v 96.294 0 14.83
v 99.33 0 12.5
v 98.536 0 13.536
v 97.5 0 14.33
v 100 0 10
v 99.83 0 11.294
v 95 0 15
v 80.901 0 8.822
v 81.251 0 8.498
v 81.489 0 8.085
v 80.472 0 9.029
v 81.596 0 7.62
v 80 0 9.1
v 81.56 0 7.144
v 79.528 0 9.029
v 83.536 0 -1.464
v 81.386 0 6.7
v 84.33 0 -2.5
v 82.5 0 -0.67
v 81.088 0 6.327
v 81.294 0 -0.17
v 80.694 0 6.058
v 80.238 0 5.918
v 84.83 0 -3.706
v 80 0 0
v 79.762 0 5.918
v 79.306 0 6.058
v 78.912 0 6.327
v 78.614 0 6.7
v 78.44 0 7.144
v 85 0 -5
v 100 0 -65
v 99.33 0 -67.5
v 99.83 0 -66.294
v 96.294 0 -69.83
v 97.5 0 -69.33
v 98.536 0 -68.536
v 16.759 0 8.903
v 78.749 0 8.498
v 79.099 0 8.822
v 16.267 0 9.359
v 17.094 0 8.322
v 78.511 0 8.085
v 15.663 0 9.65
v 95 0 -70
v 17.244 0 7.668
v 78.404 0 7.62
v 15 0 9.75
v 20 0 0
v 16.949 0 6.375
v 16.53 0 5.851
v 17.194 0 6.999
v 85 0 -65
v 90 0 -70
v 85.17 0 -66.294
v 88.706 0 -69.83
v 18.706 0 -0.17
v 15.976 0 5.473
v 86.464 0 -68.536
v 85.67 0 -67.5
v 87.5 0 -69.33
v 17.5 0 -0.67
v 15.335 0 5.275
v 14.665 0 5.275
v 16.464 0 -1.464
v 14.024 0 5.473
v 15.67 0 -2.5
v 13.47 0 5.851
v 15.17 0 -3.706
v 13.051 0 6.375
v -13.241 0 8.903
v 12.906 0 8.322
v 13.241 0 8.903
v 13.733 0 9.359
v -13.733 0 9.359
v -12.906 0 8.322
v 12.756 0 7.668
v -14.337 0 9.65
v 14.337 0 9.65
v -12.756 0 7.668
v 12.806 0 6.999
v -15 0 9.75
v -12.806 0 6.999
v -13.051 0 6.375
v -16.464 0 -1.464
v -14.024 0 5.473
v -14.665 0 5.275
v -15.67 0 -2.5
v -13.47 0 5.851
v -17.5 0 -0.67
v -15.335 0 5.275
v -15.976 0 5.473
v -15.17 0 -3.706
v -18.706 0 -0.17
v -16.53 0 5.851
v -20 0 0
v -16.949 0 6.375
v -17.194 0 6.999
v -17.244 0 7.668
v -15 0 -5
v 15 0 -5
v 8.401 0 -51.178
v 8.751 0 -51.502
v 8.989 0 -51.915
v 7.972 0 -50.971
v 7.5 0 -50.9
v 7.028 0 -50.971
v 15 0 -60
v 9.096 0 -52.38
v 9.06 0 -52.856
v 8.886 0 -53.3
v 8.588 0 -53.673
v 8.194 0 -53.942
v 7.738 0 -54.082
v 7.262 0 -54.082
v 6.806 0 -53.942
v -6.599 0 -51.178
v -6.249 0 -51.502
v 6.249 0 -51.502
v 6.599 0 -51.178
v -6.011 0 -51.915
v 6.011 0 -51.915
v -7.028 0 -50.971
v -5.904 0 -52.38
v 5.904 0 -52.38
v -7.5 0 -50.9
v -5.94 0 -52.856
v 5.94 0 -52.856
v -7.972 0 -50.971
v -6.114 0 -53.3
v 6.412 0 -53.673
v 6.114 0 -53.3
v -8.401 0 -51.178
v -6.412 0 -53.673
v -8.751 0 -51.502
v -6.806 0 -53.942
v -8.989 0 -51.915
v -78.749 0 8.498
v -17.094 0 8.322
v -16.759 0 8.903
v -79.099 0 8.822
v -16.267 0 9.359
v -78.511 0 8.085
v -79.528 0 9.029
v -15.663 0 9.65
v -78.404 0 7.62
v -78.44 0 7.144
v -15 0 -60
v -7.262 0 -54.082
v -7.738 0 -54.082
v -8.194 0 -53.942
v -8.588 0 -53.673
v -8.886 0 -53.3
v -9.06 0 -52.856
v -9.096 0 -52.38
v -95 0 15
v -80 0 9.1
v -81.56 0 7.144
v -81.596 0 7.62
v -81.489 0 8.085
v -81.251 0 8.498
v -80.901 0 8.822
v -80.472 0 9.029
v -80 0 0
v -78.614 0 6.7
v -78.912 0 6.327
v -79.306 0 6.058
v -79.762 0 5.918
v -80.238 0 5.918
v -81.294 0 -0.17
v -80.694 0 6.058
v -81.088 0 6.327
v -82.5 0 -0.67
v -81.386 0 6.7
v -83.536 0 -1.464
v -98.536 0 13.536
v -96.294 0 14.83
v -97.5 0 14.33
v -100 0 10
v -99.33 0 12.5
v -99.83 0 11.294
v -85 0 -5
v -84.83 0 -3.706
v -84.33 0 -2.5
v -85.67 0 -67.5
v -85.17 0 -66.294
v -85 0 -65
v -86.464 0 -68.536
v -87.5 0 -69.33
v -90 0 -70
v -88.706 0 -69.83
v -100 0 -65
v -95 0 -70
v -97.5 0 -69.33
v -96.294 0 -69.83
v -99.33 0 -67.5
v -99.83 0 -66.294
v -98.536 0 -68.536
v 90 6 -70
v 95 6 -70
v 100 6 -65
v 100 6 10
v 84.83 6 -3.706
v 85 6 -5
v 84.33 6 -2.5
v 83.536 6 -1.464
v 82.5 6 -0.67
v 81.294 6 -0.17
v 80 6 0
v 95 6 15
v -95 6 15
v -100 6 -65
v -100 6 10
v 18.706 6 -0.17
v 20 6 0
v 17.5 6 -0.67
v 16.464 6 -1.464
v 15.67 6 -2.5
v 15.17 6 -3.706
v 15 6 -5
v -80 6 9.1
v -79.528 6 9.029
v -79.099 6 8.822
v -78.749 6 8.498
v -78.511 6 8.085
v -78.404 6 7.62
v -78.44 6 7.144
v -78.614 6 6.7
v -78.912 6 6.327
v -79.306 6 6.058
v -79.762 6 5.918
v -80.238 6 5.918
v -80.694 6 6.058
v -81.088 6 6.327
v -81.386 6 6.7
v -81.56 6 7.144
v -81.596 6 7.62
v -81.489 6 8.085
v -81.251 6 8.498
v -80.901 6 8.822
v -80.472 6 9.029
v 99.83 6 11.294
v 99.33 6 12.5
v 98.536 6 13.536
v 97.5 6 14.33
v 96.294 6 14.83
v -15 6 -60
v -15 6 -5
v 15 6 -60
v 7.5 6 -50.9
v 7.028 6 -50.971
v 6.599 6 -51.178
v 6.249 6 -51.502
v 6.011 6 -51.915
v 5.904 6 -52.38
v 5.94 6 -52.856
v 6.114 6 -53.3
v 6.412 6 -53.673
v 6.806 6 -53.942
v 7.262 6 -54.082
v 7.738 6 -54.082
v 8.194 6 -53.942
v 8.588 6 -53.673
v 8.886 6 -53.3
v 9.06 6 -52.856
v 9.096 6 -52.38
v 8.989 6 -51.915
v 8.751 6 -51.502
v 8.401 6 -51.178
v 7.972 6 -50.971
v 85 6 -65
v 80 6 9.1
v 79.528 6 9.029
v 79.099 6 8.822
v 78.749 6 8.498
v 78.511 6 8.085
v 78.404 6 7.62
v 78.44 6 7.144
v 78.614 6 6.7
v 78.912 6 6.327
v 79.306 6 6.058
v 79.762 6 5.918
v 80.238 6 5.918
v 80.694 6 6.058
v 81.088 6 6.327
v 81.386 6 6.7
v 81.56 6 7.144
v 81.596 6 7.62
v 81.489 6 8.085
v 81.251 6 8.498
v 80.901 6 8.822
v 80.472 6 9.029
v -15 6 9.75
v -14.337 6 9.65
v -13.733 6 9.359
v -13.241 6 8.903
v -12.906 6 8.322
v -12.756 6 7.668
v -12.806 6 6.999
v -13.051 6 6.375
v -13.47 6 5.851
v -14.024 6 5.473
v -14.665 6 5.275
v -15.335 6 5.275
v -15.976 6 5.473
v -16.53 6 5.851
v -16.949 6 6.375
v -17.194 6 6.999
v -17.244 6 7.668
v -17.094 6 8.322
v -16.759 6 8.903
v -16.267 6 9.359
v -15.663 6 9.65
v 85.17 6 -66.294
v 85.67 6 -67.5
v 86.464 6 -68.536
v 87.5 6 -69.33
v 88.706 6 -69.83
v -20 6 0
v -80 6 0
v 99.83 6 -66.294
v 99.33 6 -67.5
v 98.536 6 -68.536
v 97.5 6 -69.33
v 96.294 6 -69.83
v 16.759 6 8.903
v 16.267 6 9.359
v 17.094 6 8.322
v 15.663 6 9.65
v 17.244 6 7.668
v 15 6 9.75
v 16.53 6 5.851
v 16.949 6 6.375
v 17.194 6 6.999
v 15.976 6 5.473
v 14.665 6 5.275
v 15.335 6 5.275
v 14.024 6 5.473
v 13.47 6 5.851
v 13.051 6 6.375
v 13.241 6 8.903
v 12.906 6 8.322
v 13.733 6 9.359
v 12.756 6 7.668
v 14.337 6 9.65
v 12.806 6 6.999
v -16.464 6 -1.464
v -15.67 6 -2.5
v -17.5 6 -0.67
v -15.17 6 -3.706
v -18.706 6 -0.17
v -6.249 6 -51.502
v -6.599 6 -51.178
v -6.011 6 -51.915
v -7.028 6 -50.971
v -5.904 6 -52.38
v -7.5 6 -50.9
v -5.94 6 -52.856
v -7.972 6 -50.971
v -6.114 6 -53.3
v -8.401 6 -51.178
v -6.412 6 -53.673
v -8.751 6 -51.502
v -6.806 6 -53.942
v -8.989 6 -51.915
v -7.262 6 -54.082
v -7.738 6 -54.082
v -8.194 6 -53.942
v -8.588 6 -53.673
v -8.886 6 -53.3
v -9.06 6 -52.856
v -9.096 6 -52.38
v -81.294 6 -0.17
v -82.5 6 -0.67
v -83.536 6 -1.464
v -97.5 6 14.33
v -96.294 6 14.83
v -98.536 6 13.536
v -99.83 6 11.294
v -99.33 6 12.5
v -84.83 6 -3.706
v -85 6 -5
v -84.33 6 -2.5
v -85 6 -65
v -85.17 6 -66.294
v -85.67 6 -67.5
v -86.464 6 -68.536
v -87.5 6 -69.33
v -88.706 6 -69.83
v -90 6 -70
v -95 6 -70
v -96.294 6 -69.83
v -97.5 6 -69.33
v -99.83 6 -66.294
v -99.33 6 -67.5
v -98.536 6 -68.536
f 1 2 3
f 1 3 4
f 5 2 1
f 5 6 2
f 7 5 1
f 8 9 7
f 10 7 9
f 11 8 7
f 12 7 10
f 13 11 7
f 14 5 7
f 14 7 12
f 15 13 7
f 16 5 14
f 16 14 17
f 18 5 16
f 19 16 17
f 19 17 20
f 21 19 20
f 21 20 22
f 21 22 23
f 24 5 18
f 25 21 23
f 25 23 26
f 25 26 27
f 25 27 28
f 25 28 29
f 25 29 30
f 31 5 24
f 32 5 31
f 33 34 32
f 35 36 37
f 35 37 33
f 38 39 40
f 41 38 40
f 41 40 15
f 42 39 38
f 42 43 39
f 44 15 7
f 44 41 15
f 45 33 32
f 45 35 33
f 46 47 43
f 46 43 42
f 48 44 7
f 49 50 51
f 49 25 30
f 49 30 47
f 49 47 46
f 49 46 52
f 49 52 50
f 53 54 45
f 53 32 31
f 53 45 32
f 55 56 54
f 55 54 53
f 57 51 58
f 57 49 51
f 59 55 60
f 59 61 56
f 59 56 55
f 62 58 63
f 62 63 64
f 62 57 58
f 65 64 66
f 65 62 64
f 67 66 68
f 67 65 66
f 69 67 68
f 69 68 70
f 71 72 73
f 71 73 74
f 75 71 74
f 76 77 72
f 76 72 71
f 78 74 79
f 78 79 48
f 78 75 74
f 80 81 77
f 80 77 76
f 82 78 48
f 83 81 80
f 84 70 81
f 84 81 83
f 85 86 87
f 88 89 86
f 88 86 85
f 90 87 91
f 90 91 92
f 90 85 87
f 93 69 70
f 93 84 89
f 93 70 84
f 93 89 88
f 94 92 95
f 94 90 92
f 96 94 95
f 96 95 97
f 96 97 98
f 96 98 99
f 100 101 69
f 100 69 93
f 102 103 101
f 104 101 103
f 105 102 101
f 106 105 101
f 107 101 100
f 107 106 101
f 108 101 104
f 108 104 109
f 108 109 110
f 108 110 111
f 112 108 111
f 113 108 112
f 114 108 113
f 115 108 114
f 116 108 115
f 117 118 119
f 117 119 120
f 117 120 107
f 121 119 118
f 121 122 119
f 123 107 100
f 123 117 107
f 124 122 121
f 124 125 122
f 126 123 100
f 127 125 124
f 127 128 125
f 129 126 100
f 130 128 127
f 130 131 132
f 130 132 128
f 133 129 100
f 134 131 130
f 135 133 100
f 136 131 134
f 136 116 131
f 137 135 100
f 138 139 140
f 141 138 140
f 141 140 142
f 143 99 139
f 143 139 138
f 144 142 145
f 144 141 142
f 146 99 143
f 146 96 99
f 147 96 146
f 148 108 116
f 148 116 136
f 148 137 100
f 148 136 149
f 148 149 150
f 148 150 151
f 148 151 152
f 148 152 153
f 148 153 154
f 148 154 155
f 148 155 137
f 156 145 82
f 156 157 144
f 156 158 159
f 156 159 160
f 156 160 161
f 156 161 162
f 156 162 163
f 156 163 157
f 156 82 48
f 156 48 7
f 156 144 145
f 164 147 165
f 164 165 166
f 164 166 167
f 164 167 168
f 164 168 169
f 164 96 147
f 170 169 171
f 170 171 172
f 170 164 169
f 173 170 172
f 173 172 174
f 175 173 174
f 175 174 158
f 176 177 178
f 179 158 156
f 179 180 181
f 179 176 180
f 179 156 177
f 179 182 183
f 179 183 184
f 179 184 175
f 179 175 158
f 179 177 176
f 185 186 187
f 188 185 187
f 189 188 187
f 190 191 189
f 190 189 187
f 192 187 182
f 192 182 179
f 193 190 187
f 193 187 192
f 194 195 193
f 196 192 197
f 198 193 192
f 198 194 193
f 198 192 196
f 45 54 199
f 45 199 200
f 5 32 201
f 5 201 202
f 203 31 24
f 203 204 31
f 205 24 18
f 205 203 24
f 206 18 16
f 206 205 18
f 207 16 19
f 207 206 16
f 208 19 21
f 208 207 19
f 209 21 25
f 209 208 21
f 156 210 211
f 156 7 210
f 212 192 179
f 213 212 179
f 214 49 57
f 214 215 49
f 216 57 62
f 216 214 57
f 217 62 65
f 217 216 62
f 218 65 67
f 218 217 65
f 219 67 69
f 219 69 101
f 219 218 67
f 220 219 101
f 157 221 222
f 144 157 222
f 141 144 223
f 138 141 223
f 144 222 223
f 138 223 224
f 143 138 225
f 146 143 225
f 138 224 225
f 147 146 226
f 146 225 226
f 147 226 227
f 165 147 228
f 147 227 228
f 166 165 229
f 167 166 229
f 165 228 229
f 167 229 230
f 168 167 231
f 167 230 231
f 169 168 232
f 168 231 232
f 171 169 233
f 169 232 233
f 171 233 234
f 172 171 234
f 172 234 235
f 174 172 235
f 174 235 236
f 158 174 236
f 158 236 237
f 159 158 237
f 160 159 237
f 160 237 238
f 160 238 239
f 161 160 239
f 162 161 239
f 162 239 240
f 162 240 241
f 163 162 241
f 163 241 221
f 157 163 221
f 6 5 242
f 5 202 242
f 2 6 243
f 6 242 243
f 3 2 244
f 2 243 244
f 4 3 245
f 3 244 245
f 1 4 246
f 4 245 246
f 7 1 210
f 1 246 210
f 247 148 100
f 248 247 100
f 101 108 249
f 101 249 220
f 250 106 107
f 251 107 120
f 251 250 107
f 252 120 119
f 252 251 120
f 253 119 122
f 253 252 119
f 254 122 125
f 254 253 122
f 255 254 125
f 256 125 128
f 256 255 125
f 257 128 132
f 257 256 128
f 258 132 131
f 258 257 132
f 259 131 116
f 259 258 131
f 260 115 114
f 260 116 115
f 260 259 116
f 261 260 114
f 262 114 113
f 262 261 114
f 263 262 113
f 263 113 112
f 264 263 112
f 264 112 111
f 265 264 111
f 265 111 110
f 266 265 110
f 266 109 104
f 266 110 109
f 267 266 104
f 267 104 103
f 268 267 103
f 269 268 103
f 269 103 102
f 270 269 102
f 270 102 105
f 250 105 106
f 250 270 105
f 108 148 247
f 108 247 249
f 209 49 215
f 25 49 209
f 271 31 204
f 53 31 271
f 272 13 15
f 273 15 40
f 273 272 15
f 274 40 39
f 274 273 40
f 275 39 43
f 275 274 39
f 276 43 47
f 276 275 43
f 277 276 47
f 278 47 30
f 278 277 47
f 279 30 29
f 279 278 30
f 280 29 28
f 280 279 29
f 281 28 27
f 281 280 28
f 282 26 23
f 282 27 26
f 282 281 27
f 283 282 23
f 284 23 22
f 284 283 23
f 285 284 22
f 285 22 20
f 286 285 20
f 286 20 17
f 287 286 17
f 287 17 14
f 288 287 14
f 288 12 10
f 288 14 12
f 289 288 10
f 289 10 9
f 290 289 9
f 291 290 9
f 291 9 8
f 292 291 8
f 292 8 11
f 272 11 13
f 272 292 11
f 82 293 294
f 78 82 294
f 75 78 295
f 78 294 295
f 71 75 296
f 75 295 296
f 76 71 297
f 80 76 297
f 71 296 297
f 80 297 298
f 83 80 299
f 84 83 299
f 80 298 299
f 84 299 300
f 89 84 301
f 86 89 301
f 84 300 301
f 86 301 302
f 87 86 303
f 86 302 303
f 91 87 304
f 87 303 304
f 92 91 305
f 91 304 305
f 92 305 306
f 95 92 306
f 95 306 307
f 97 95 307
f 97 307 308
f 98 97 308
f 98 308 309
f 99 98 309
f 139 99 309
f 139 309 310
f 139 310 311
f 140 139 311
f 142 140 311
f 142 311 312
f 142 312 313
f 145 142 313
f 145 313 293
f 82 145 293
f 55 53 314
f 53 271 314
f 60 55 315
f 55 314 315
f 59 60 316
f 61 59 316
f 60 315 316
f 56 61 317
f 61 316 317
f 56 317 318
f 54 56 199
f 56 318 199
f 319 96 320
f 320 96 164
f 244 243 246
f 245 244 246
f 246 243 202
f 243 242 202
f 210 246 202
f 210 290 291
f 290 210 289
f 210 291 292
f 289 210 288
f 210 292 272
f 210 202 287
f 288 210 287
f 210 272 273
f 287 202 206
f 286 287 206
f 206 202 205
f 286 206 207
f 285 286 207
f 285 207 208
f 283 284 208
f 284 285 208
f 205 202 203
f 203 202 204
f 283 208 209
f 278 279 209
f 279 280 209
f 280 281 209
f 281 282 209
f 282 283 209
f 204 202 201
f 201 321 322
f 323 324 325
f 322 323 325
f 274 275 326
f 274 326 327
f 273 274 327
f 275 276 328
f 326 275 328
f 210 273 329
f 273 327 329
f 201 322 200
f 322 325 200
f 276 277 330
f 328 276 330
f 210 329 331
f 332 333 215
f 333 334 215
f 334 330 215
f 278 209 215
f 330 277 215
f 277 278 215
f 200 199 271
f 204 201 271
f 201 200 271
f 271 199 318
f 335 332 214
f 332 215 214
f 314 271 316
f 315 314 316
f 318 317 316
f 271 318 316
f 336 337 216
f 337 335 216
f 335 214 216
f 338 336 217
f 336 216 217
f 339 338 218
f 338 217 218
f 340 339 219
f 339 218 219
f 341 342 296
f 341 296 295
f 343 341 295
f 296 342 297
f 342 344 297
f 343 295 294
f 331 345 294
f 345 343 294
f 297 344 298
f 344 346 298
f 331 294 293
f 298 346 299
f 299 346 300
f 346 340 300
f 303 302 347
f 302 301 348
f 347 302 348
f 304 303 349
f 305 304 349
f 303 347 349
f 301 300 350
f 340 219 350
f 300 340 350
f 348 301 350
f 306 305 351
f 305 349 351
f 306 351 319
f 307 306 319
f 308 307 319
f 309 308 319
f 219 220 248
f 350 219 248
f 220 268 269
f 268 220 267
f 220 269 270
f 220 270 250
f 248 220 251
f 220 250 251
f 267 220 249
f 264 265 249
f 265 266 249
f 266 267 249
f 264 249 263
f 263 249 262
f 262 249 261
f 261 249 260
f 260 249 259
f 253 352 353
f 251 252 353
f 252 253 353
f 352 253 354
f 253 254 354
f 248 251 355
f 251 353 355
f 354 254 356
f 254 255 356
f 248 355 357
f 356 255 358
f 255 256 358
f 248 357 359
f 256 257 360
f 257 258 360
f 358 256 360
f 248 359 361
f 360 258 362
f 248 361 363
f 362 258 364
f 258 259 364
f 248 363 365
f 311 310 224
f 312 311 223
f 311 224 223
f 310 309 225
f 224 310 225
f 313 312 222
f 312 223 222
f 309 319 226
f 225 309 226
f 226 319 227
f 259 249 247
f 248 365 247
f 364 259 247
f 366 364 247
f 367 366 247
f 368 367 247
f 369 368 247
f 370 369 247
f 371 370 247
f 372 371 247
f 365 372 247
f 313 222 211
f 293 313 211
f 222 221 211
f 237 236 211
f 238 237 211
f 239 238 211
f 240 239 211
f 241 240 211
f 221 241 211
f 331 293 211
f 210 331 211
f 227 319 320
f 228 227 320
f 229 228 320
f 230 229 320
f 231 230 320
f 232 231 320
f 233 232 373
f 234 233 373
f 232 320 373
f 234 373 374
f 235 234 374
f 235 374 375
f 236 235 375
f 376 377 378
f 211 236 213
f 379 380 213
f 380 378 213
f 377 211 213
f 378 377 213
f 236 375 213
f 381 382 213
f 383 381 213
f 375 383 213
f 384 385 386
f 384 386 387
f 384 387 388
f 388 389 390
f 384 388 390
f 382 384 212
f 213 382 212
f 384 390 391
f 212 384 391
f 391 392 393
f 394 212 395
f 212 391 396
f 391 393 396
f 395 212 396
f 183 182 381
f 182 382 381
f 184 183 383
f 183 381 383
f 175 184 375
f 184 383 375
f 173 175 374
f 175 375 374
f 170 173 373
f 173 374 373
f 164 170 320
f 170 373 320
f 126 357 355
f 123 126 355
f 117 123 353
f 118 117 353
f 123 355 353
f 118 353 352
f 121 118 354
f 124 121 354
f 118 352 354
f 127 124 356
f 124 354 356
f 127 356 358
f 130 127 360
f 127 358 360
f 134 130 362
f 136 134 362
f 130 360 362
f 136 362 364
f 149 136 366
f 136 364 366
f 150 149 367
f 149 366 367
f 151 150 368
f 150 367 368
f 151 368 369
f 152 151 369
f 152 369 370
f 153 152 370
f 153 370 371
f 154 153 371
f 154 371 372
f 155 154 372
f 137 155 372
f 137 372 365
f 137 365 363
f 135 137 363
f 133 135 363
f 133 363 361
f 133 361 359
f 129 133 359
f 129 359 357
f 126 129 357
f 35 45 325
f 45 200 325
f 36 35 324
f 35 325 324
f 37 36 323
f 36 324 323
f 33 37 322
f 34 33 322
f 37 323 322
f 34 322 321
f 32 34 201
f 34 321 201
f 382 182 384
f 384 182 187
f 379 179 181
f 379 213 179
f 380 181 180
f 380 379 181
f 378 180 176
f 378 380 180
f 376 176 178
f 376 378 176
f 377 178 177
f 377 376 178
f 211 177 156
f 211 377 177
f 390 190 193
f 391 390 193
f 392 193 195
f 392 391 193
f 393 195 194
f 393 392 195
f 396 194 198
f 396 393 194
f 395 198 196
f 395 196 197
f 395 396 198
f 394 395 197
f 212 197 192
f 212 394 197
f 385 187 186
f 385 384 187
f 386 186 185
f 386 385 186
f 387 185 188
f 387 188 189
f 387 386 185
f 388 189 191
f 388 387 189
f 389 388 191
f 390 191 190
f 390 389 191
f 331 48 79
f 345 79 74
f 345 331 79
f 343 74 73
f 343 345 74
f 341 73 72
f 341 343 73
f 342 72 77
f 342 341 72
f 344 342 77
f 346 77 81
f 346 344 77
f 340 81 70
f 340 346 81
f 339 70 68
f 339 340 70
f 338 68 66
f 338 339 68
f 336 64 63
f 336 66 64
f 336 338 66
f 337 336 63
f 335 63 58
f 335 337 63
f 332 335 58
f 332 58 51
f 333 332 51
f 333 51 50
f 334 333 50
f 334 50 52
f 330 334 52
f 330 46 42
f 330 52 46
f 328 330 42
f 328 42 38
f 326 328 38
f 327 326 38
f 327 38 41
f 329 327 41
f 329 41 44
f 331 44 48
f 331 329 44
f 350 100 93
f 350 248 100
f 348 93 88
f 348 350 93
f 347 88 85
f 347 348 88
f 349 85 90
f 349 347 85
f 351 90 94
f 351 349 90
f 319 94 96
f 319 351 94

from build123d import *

# Parameters (mm, degrees)
BOSS_EXTRUDE1_DEPTH  = 6
FILLET1_R            = 5
SKETCH2_R            = 2.25
SKETCH2_R_2          = 1.6
CUT_EXTRUDE1_DEPTH   = 123.21292894
FILLET1_OF_MIRROR1_R = 5


with BuildPart() as part:
    # Sketch1 → Boss-Extrude1 (new body)
    with BuildSketch(Plane(origin=(0, 0, 0), x_dir=(1, 0, 0), z_dir=(0, 1, 0))):
        Polygon((-85, 0), (-85, 70), (-100, 70), (-100, -15), (0, -15), (0, 0), (0, 60), (-15, 60), (-15, 0), align=None)
    boss_extrude1 = extrude(amount=BOSS_EXTRUDE1_DEPTH)

    # Fillet1
    fillet1_edges = [part.edges().sort_by_distance(p)[0] for p in [
        (-100, 3, 15),
        (-100, 3, -70),
        (-85, 3, -70),
        (-85, 3, 0),
        (-15, 3, 0),
    ]]
    fillet(fillet1_edges, radius=FILLET1_R)

    # Sketch2 → Cut-Extrude1 (cut, through all)
    with BuildSketch(Plane(origin=(0, 6, 0), x_dir=(1, 0, 0), z_dir=(0, 1, 0))):
        with Locations(Location((-15, -7.5, 0), (0, 0, 270))):
            Circle(SKETCH2_R)
        with Locations(Location((-80, -7.5, 0), (0, 0, 270))):
            Circle(SKETCH2_R_2)
        with Locations(Location((-7.5, 52.5, 0), (0, 0, 270))):
            Circle(SKETCH2_R_2)
    cut_extrude1 = extrude(amount=-CUT_EXTRUDE1_DEPTH, mode=Mode.SUBTRACT)

    # Mirror1: Boss-Extrude1, Cut-Extrude1 across plane
    add(boss_extrude1.mirror(Plane(origin=(0, 0, 0), x_dir=(0, 0, 1), z_dir=(1, 0, 0))))
    add(cut_extrude1.mirror(Plane(origin=(0, 0, 0), x_dir=(0, 0, 1), z_dir=(1, 0, 0))), mode=Mode.SUBTRACT)

    # Fillet1 of Mirror1
    fillet1_of_mirror1_edges = [part.edges().sort_by_distance(p)[0] for p in [
        (100, 3, 15),
        (100, 3, -70),
        (85, 3, -70),
        (85, 3, 0),
        (15, 3, 0),
    ]]
    fillet(fillet1_of_mirror1_edges, radius=FILLET1_OF_MIRROR1_R)


solid = part.part
